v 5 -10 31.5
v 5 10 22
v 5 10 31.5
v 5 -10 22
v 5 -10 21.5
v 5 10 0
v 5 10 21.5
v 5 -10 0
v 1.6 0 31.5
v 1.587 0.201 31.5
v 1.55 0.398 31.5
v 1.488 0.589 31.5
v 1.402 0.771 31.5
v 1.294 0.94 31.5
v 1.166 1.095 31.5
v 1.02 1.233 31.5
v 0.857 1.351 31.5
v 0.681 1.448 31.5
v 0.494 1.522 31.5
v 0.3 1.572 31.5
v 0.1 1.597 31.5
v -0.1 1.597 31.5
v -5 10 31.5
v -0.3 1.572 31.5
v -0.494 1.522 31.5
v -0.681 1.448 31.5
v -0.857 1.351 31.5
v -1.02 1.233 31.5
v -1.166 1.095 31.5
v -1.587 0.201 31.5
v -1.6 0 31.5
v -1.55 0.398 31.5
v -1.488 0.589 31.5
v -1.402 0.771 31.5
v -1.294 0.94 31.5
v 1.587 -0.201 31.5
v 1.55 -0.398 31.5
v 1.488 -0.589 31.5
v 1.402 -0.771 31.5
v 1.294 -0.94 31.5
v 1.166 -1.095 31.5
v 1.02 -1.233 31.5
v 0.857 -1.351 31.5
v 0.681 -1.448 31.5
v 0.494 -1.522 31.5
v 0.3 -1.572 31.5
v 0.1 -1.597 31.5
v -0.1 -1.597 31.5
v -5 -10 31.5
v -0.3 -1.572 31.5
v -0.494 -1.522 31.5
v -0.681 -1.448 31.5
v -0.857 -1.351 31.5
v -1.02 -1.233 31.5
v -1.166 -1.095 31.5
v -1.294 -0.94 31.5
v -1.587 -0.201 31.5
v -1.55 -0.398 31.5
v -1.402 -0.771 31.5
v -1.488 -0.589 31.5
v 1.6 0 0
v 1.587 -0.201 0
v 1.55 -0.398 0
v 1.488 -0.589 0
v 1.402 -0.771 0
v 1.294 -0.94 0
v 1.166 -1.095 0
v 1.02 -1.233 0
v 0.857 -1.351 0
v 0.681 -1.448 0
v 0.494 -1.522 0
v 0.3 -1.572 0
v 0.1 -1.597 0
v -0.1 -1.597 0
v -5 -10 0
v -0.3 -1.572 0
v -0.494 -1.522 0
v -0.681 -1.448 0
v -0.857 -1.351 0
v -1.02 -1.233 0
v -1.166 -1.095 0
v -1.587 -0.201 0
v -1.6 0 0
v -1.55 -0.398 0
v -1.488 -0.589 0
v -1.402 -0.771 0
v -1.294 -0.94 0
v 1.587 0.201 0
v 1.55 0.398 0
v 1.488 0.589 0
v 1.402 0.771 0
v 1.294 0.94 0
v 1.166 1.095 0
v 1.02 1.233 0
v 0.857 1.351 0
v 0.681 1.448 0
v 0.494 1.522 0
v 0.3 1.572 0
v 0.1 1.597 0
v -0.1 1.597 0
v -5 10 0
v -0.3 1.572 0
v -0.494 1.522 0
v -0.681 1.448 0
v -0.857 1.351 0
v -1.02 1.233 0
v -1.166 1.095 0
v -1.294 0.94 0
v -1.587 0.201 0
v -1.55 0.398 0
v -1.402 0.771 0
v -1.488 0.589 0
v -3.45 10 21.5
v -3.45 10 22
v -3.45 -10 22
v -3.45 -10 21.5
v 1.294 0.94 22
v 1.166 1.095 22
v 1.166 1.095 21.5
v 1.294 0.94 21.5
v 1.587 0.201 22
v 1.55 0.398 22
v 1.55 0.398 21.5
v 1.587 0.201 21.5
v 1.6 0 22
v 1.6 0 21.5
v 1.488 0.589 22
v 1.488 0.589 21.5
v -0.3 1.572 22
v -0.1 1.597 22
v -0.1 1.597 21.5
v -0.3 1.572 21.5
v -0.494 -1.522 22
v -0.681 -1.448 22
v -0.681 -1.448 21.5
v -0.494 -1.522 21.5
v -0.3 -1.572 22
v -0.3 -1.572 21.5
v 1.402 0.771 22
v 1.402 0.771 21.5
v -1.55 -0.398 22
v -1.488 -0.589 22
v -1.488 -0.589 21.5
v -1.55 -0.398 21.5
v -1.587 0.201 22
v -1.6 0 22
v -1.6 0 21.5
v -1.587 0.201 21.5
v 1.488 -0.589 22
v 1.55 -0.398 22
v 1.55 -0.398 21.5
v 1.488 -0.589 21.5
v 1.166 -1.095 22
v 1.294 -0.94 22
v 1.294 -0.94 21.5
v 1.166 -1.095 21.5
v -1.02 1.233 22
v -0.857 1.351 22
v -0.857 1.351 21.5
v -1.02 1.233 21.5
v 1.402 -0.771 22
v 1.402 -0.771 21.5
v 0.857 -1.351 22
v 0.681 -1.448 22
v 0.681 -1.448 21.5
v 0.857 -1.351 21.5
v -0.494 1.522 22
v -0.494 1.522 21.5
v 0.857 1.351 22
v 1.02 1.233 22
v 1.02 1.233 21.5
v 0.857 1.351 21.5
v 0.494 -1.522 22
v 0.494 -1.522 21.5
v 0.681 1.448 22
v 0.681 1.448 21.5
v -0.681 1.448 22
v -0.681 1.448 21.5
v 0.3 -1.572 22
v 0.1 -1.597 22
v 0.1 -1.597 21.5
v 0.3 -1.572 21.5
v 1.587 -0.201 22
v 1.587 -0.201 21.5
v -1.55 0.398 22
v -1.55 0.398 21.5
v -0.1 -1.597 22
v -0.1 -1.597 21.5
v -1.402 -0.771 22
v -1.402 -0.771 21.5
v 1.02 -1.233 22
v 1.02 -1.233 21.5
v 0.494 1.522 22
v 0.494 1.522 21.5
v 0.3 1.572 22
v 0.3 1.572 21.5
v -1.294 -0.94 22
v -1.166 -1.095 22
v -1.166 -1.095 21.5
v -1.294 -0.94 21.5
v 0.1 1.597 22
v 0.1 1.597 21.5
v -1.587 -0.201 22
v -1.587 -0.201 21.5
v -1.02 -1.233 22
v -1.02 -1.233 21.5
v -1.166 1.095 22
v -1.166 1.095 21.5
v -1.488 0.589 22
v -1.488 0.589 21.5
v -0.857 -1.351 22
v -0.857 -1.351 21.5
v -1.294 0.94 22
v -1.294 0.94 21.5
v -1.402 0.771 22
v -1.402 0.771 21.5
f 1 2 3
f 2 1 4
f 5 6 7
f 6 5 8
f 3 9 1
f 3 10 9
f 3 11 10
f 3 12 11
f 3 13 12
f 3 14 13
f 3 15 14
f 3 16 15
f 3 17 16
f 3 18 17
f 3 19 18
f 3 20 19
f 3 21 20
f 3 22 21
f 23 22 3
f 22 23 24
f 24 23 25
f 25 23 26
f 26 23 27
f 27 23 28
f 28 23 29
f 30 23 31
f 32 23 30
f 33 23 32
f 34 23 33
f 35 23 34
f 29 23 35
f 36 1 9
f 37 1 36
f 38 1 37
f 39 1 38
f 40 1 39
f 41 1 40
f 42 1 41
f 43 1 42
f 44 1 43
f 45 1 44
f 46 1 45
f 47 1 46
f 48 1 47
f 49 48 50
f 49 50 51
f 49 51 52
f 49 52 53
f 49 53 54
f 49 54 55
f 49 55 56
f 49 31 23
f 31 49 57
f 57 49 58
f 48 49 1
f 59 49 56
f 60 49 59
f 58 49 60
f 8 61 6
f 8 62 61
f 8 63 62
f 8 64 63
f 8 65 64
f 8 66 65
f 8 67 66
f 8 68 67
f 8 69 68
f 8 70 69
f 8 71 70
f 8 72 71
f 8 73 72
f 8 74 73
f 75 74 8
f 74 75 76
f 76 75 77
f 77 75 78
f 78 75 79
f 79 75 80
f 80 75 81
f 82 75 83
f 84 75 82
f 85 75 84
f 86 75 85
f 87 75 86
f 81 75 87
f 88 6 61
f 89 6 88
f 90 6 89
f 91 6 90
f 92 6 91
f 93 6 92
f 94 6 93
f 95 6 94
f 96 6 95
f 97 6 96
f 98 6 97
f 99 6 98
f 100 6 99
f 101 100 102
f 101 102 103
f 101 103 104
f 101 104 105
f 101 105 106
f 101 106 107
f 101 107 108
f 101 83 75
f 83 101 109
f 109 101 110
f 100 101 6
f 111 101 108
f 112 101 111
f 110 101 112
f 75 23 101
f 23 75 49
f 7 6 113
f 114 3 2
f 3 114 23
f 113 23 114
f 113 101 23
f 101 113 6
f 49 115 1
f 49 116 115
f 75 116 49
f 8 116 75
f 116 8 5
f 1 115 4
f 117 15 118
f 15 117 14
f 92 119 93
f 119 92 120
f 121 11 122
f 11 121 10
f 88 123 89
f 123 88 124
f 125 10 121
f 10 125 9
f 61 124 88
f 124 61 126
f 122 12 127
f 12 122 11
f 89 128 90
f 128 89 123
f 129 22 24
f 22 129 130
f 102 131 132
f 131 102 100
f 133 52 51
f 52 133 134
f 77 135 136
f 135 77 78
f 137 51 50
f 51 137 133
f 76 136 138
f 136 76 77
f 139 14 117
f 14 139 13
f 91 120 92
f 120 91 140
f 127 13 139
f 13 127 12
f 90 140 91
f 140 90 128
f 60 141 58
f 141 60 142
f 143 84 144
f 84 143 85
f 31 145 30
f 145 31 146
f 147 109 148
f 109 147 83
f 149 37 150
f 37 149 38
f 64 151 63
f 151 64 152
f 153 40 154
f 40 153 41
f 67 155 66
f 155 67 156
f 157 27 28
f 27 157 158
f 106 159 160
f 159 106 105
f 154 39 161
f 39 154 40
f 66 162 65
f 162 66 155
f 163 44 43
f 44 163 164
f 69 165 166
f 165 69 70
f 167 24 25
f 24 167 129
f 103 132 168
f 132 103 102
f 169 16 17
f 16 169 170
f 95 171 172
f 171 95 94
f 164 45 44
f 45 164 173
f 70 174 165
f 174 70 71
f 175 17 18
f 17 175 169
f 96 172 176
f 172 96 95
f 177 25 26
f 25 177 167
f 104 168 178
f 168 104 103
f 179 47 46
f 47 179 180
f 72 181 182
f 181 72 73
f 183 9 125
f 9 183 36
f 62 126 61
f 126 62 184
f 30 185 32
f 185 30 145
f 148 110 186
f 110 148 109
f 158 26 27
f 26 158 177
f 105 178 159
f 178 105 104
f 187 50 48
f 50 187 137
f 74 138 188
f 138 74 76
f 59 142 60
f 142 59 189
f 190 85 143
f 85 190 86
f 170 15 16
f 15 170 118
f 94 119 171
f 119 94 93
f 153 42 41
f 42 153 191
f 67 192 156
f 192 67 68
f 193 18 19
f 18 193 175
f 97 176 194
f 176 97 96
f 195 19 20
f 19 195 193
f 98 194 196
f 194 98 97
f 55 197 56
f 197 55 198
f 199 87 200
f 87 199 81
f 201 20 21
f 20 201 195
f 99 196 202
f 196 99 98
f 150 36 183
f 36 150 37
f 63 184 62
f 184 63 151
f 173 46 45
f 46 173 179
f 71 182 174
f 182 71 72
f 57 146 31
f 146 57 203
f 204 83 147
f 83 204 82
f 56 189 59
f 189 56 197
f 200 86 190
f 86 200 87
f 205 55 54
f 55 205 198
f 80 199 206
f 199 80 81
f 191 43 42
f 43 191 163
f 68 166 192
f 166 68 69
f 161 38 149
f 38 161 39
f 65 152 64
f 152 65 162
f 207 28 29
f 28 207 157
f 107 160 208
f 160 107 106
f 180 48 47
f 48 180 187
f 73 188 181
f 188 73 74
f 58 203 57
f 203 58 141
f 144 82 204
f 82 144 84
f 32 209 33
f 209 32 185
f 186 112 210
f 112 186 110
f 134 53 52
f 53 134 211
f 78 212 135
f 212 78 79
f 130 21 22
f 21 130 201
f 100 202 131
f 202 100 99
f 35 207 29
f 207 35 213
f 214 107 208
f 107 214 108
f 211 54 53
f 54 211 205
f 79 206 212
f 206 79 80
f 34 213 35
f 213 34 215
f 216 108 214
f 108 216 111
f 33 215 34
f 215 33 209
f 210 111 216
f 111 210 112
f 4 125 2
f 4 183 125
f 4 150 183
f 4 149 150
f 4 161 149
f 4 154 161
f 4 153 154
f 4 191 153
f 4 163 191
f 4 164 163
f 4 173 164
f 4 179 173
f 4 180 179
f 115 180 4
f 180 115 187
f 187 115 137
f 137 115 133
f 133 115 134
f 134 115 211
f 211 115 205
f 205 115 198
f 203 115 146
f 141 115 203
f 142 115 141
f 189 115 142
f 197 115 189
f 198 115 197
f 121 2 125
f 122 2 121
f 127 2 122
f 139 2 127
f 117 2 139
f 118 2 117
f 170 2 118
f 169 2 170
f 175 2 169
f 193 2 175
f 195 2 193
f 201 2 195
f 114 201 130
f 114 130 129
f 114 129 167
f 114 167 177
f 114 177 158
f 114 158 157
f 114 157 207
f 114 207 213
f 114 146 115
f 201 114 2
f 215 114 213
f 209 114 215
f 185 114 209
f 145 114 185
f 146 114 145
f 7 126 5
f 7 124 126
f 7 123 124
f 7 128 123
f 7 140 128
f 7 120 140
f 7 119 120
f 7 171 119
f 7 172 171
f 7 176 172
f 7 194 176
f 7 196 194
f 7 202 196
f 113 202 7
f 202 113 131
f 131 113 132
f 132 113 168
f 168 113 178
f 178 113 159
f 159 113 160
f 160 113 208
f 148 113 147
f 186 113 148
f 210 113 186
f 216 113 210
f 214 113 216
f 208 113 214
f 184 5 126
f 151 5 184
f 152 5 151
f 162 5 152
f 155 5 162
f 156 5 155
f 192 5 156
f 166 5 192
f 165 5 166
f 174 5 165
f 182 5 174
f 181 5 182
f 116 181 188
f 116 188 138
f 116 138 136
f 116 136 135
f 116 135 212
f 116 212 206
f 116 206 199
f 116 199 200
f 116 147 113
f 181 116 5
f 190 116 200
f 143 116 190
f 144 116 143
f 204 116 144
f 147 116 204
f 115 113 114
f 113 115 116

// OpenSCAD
// file: ../../Parameters.scad
//Main tube diameter - hole [mm]
main_tube_outer_diameter = 25.4;
main_tube_inner_diameter = 23.5;

//Tube for undercarriage - rendered hole [mm]
tube_for_undercarriage_outer_diameter = 10.6;
tube_for_undercarriage_inner_diameter = 6;
global_clearance = 0.5;

// Nastavení parametrů rotoru

rotor_blade_AOA = 1.5;      // nastavení úhlu náběhu rotorového listu
rotor_blade_length = 970;   // délka rotorového listu
rator_blade_depth = 50;     // hloubka rotorového listu


// Parameters of tube couplings
coupling_wall_thickness = main_tube_outer_diameter/5;  //width of coupling walls 
thickness_between_tubes = main_tube_outer_diameter/10;    // minimum distance between tubes in couplings

coupling_wall_thickness_undercarriage = tube_for_undercarriage_outer_diameter/3;
thickness_between_tubes_undercarriage = tube_for_undercarriage_outer_diameter/10;

// screw length step - minimum difference in length between two types of screws
basic_screw_length = 5;


//Screw diameter and nut for M6 [mm]
M6_screw_diameter=6.5;
Nut_height_M6 = 4.9;
Nut_diameter_M6 = 11.8;


//Screw diameter and nut for M4 [mm]
M4_screw_diameter=4.5;
Nut_height_M4 = 3.2;
Nut_diameter_M4 = 8.4;
Screw_head_height_M4 = 4;

//Screw diameter and nut for M3 [mm]
M3_screw_diameter = 3.2;
Nut_height_M3 = 2.7;	
Nut_diameter_M3 = 6.6; 
Screw_head_height_M3 = 3;


//šroub servo
Servo_screw = 1.5;

//The tube for help
Help_main_tube_outer = 25;
Help_main_tube_inner = 23; 
Help_tube_for_undercarriage_outer = 10;
Help_tube_for_undercarriage_inner = 5;


//main hull parameters

hull_drop_length = 580;
hull_wall_thickness = 0.8;
hull_y_size = 120;
hull_z_size = 150;
hull_x_size = 580;
hull_corner_radius = 4;
hull_airfoil_thickness= 35;  // thickness of drop generating airfoil in percent of length.
hull_scale_x = 1;
hull_scale_y = 1.5;
hull_scale_z = 1.5;

main_pilon_position = 170+68+30;       // pozice rotorového pilonu měřená od přední části krytu
cover_pilon_position = 180;
height_of_vertical_tube = 275; //278mm je změřená délka trubky. 

//délka hlavní dlouhé trubky
length_of_main_tube = 820;
length_of_undercarriage_tube = 300;

ribbon_width = 5; // šířka vyztužovacích lemů. 

// šířka otvoru v přední části kapoty pro držák motoru.
width_of_engine_holder = 63;

//Top Cover Division - dělení horního krytu pro tisk
top_cover_division = [0, 50, 150, 280, 410, hull_x_size]; // upraveny seznam tak, aby deleni začinalo od nuly, což umožňí úplně automatické rozdělení.

//Bottom Cover Division - dělení dolního krytu pro tisk
bottom_cover_division = [0,100,232.5,365, 470, hull_x_size];
// zkrácená část pro payload pro testovací tisk
//bottom_cover_division = [0,200,250,365, 470, hull_x_size];





//Cover pilon division - na výšku (v ose Z)
cover_pilon_division = [0,170,height_of_vertical_tube + main_tube_outer_diameter + coupling_wall_thickness];

//pozice šroubů
	//horní kryt
top_screw_position = [0,
                    (top_cover_division[0] + top_cover_division[1])/2,
                    (top_cover_division[2] - top_cover_division[1])/2 + top_cover_division[1],
                    (top_cover_division[3] - top_cover_division[2])/2 + top_cover_division[2],
                    (top_cover_division[4] - top_cover_division[3])/8 + top_cover_division[3],
                    (top_cover_division[5] - top_cover_division[4])/2 + top_cover_division[4] - top_cover_division[1]/3];
	//spodní kryt
bottom_screw_position = [0,
                        (bottom_cover_division[0] + bottom_cover_division[1])*(2/6), 
                        bottom_cover_division[1]*(9/10), 
                        bottom_cover_division[3] + bottom_cover_division[1]*(1/10), 
                        bottom_cover_division[3] + bottom_cover_division[1]*(3/5)];




//šířka zámků
lock_width = 10;

//délka zámků
lock_length = 3;


//accumulator
//základní rozměry akumulátoru
width_of_accumulator = 129.4;//45+1;
depth_of_accumulator = 40.61;
height_of_accumulator = 43.65;
//Zapuštění akumulátoru
sink_of_accumulator = 5; //main_tube_outer_diameter/5 - Nut_height_M3*1.5;

//tloušťka hrany spojky
accumulator_holder_width = 18; 
accumulator_holder_thickness = 10; 

//posunutí akumálátoru na podložce
move_of_accumulator = 75;   // pozice akumulátoru (ovlivňuje těžiště)


////////////////
// Senzory
///////////////////

//opticalFlow
width_optical_flow_senzor = 45.5;
depth_optical_flow_senzor = 6;
height_optical_flow_senzor = 35;
sink_of_optical_flow_senzor = depth_optical_flow_senzor - 5; 
M3_optical_flow_senzor_Z = 30.4;
M3_optical_flow_senzor_X = 24;
M3_optical_flow_senzor_Z_alone = 9.1;
M3_optical_flow_senzor_X_alone = 16.7;

//GPS anténa
GPS_outer_length = 48.01;   //Vnější rozměr
GPS_inner_length = 37.48;   //Vnitřní rozměr
GPS_diameter = (GPS_outer_length - GPS_inner_length)/2;    //Průměr otvoru
GPS_middle_length = GPS_diameter + GPS_inner_length;      //Střední rozměr


////podzvozek

radius_undercarriage = 25;
vzdalenost_x = tan(20) * 131;
vzdalenost_y = (131 - radius_undercarriage)/tan(79);
uhel_y = 90 - 20;
uhel_x = 90 - 79;

maximum_printable_size = 150;


////Pitotova trubice
Pitot_tube_diameter = 4.02 + 1;
Distance_hole_from_tube = 11.92;  //vzdálenost otvoru pro připevnění od samotné trubičky


////směrové kormidlo
Rudder_length = 4*main_tube_outer_diameter;
Rudder_height = 2*main_tube_outer_diameter;
Rudder_depth = main_tube_outer_diameter/2;
gap_width = 2*hull_wall_thickness;      //šířka mezery mezi směrovkou a ocasní plochou
ruder_shaft_diameter = 2.6; //otočné uchycení směrovky - průměr 2 mm


/////spojka 666_1004

    width_666_1004 = (main_tube_outer_diameter+2*coupling_wall_thickness - Screw_head_height_M3)/basic_screw_length;
        echo("width_666_1004 is", width_666_1004);
    
        echo("ceil_666_1004 is", ceil(width_666_1004));

    coupling_screw_length_666_1004 = (ceil(width_666_1004)) * basic_screw_length;
        echo("coupling_screw_length_666_1004 is", coupling_screw_length_666_1004);

    coupling_width_666_1004 = coupling_screw_length_666_1004 + Screw_head_height_M3;
        echo("coupling_width_666_1004 is", coupling_width_666_1004);

    height_666_1004 = coupling_width_666_1004;
        echo("height_666_1004 is", height_666_1004);

/////spojka 666_1026



    width_666_1026 = main_tube_outer_diameter + 2*thickness_between_tubes;
    
    depth_666_1026 = (main_tube_outer_diameter*2)/basic_screw_length;
        echo("depth_666_1026 is", depth_666_1026);
    
        echo("ceil_666_1026 is", ceil(depth_666_1026));

    coupling_screw_length_666_1026 = (ceil(depth_666_1026)) * basic_screw_length;
        echo("coupling_screw_length_666_1026 is", coupling_screw_length_666_1026);


thickness_of_plate = coupling_screw_length_666_1026 - Screw_head_height_M4 - 50; //50 mm je konstatní šířka spojky 666_1026
    echo("thickness_of_plate is", thickness_of_plate);

        coupling_depth_666_1026 = coupling_screw_length_666_1026 - Screw_head_height_M4 - thickness_of_plate;      //zde je odečten screw_head_height_M4 pro určení šířky, tak aby šroub přesahoval pro potřebnou matku
            echo("coupling_depth_666_1026 is", coupling_depth_666_1026);

    height_666_1026 = coupling_depth_666_1026;
        echo("height_666_1026 is", height_666_1026);

//tloušťka plechu pro zajištění konstatní šířky spojky 50 mm



////spojka 666_1017

    width_666_1017 = (main_tube_outer_diameter + 4*coupling_wall_thickness - Screw_head_height_M3)/basic_screw_length;
        echo("width_666_1017 is", width_666_1017);
    
        echo("ceil_666_1017 is", ceil(width_666_1017));

    coupling_screw_length_666_1017 = (ceil(width_666_1017)) * basic_screw_length;
        echo("coupling_screw_length_666_1017 is", coupling_screw_length_666_1017);

    coupling_width_666_1017 = coupling_screw_length_666_1017 + Screw_head_height_M3;
        echo("coupling_width_666_1017 is", coupling_width_666_1017);

    depth_666_1017 = coupling_width_666_1017;

    height_666_1017= 70; //main_tube_outer_diameter*1.8+main_tube_outer_diameter+wall_thickness;






//umístění podvozkových trubek

second_undercarriage_hole = main_tube_outer_diameter*2 + main_tube_outer_diameter/5 + main_tube_outer_diameter/2 + 170 + 160;


//Base Divison - dělení podložky
base_division = [0, 159, main_pilon_position + coupling_width_666_1017/2 + global_clearance/2, second_undercarriage_hole + coupling_width_666_1004/2 + global_clearance/2, hull_x_size];

// šrouby pro připevnění podložky k hlavní trubce
base_mounting_screw_length = 50;
// main file
draft = true;

module screw_cutter(draft){

width = 10;
depth = 20;


//délka šroubu, kterou potřebujeme
height_need_screw = 21.5;

//délka navíc pro upevnění šroubu
tolerance = 10;

//průměr řezaného šroubu
diamter_of_cut_screw = M3_screw_diameter;


difference(){

	translate([-width/2, -depth/2,0])
			cube([width,depth,height_need_screw + tolerance]);

	//šroub
	translate([0,0,-global_clearance/2])
			cylinder (h = height_need_screw + tolerance + global_clearance, r = diamter_of_cut_screw/2, $fn = draft ? 50 : 100 );

	//prořez
	translate([- global_clearance/2 - diamter_of_cut_screw, - depth/2 - global_clearance/2,height_need_screw])
			cube([width + global_clearance, depth + global_clearance, global_clearance]);

	}	

}


screw_cutter(draft);



include <../../Parameters.scad>
